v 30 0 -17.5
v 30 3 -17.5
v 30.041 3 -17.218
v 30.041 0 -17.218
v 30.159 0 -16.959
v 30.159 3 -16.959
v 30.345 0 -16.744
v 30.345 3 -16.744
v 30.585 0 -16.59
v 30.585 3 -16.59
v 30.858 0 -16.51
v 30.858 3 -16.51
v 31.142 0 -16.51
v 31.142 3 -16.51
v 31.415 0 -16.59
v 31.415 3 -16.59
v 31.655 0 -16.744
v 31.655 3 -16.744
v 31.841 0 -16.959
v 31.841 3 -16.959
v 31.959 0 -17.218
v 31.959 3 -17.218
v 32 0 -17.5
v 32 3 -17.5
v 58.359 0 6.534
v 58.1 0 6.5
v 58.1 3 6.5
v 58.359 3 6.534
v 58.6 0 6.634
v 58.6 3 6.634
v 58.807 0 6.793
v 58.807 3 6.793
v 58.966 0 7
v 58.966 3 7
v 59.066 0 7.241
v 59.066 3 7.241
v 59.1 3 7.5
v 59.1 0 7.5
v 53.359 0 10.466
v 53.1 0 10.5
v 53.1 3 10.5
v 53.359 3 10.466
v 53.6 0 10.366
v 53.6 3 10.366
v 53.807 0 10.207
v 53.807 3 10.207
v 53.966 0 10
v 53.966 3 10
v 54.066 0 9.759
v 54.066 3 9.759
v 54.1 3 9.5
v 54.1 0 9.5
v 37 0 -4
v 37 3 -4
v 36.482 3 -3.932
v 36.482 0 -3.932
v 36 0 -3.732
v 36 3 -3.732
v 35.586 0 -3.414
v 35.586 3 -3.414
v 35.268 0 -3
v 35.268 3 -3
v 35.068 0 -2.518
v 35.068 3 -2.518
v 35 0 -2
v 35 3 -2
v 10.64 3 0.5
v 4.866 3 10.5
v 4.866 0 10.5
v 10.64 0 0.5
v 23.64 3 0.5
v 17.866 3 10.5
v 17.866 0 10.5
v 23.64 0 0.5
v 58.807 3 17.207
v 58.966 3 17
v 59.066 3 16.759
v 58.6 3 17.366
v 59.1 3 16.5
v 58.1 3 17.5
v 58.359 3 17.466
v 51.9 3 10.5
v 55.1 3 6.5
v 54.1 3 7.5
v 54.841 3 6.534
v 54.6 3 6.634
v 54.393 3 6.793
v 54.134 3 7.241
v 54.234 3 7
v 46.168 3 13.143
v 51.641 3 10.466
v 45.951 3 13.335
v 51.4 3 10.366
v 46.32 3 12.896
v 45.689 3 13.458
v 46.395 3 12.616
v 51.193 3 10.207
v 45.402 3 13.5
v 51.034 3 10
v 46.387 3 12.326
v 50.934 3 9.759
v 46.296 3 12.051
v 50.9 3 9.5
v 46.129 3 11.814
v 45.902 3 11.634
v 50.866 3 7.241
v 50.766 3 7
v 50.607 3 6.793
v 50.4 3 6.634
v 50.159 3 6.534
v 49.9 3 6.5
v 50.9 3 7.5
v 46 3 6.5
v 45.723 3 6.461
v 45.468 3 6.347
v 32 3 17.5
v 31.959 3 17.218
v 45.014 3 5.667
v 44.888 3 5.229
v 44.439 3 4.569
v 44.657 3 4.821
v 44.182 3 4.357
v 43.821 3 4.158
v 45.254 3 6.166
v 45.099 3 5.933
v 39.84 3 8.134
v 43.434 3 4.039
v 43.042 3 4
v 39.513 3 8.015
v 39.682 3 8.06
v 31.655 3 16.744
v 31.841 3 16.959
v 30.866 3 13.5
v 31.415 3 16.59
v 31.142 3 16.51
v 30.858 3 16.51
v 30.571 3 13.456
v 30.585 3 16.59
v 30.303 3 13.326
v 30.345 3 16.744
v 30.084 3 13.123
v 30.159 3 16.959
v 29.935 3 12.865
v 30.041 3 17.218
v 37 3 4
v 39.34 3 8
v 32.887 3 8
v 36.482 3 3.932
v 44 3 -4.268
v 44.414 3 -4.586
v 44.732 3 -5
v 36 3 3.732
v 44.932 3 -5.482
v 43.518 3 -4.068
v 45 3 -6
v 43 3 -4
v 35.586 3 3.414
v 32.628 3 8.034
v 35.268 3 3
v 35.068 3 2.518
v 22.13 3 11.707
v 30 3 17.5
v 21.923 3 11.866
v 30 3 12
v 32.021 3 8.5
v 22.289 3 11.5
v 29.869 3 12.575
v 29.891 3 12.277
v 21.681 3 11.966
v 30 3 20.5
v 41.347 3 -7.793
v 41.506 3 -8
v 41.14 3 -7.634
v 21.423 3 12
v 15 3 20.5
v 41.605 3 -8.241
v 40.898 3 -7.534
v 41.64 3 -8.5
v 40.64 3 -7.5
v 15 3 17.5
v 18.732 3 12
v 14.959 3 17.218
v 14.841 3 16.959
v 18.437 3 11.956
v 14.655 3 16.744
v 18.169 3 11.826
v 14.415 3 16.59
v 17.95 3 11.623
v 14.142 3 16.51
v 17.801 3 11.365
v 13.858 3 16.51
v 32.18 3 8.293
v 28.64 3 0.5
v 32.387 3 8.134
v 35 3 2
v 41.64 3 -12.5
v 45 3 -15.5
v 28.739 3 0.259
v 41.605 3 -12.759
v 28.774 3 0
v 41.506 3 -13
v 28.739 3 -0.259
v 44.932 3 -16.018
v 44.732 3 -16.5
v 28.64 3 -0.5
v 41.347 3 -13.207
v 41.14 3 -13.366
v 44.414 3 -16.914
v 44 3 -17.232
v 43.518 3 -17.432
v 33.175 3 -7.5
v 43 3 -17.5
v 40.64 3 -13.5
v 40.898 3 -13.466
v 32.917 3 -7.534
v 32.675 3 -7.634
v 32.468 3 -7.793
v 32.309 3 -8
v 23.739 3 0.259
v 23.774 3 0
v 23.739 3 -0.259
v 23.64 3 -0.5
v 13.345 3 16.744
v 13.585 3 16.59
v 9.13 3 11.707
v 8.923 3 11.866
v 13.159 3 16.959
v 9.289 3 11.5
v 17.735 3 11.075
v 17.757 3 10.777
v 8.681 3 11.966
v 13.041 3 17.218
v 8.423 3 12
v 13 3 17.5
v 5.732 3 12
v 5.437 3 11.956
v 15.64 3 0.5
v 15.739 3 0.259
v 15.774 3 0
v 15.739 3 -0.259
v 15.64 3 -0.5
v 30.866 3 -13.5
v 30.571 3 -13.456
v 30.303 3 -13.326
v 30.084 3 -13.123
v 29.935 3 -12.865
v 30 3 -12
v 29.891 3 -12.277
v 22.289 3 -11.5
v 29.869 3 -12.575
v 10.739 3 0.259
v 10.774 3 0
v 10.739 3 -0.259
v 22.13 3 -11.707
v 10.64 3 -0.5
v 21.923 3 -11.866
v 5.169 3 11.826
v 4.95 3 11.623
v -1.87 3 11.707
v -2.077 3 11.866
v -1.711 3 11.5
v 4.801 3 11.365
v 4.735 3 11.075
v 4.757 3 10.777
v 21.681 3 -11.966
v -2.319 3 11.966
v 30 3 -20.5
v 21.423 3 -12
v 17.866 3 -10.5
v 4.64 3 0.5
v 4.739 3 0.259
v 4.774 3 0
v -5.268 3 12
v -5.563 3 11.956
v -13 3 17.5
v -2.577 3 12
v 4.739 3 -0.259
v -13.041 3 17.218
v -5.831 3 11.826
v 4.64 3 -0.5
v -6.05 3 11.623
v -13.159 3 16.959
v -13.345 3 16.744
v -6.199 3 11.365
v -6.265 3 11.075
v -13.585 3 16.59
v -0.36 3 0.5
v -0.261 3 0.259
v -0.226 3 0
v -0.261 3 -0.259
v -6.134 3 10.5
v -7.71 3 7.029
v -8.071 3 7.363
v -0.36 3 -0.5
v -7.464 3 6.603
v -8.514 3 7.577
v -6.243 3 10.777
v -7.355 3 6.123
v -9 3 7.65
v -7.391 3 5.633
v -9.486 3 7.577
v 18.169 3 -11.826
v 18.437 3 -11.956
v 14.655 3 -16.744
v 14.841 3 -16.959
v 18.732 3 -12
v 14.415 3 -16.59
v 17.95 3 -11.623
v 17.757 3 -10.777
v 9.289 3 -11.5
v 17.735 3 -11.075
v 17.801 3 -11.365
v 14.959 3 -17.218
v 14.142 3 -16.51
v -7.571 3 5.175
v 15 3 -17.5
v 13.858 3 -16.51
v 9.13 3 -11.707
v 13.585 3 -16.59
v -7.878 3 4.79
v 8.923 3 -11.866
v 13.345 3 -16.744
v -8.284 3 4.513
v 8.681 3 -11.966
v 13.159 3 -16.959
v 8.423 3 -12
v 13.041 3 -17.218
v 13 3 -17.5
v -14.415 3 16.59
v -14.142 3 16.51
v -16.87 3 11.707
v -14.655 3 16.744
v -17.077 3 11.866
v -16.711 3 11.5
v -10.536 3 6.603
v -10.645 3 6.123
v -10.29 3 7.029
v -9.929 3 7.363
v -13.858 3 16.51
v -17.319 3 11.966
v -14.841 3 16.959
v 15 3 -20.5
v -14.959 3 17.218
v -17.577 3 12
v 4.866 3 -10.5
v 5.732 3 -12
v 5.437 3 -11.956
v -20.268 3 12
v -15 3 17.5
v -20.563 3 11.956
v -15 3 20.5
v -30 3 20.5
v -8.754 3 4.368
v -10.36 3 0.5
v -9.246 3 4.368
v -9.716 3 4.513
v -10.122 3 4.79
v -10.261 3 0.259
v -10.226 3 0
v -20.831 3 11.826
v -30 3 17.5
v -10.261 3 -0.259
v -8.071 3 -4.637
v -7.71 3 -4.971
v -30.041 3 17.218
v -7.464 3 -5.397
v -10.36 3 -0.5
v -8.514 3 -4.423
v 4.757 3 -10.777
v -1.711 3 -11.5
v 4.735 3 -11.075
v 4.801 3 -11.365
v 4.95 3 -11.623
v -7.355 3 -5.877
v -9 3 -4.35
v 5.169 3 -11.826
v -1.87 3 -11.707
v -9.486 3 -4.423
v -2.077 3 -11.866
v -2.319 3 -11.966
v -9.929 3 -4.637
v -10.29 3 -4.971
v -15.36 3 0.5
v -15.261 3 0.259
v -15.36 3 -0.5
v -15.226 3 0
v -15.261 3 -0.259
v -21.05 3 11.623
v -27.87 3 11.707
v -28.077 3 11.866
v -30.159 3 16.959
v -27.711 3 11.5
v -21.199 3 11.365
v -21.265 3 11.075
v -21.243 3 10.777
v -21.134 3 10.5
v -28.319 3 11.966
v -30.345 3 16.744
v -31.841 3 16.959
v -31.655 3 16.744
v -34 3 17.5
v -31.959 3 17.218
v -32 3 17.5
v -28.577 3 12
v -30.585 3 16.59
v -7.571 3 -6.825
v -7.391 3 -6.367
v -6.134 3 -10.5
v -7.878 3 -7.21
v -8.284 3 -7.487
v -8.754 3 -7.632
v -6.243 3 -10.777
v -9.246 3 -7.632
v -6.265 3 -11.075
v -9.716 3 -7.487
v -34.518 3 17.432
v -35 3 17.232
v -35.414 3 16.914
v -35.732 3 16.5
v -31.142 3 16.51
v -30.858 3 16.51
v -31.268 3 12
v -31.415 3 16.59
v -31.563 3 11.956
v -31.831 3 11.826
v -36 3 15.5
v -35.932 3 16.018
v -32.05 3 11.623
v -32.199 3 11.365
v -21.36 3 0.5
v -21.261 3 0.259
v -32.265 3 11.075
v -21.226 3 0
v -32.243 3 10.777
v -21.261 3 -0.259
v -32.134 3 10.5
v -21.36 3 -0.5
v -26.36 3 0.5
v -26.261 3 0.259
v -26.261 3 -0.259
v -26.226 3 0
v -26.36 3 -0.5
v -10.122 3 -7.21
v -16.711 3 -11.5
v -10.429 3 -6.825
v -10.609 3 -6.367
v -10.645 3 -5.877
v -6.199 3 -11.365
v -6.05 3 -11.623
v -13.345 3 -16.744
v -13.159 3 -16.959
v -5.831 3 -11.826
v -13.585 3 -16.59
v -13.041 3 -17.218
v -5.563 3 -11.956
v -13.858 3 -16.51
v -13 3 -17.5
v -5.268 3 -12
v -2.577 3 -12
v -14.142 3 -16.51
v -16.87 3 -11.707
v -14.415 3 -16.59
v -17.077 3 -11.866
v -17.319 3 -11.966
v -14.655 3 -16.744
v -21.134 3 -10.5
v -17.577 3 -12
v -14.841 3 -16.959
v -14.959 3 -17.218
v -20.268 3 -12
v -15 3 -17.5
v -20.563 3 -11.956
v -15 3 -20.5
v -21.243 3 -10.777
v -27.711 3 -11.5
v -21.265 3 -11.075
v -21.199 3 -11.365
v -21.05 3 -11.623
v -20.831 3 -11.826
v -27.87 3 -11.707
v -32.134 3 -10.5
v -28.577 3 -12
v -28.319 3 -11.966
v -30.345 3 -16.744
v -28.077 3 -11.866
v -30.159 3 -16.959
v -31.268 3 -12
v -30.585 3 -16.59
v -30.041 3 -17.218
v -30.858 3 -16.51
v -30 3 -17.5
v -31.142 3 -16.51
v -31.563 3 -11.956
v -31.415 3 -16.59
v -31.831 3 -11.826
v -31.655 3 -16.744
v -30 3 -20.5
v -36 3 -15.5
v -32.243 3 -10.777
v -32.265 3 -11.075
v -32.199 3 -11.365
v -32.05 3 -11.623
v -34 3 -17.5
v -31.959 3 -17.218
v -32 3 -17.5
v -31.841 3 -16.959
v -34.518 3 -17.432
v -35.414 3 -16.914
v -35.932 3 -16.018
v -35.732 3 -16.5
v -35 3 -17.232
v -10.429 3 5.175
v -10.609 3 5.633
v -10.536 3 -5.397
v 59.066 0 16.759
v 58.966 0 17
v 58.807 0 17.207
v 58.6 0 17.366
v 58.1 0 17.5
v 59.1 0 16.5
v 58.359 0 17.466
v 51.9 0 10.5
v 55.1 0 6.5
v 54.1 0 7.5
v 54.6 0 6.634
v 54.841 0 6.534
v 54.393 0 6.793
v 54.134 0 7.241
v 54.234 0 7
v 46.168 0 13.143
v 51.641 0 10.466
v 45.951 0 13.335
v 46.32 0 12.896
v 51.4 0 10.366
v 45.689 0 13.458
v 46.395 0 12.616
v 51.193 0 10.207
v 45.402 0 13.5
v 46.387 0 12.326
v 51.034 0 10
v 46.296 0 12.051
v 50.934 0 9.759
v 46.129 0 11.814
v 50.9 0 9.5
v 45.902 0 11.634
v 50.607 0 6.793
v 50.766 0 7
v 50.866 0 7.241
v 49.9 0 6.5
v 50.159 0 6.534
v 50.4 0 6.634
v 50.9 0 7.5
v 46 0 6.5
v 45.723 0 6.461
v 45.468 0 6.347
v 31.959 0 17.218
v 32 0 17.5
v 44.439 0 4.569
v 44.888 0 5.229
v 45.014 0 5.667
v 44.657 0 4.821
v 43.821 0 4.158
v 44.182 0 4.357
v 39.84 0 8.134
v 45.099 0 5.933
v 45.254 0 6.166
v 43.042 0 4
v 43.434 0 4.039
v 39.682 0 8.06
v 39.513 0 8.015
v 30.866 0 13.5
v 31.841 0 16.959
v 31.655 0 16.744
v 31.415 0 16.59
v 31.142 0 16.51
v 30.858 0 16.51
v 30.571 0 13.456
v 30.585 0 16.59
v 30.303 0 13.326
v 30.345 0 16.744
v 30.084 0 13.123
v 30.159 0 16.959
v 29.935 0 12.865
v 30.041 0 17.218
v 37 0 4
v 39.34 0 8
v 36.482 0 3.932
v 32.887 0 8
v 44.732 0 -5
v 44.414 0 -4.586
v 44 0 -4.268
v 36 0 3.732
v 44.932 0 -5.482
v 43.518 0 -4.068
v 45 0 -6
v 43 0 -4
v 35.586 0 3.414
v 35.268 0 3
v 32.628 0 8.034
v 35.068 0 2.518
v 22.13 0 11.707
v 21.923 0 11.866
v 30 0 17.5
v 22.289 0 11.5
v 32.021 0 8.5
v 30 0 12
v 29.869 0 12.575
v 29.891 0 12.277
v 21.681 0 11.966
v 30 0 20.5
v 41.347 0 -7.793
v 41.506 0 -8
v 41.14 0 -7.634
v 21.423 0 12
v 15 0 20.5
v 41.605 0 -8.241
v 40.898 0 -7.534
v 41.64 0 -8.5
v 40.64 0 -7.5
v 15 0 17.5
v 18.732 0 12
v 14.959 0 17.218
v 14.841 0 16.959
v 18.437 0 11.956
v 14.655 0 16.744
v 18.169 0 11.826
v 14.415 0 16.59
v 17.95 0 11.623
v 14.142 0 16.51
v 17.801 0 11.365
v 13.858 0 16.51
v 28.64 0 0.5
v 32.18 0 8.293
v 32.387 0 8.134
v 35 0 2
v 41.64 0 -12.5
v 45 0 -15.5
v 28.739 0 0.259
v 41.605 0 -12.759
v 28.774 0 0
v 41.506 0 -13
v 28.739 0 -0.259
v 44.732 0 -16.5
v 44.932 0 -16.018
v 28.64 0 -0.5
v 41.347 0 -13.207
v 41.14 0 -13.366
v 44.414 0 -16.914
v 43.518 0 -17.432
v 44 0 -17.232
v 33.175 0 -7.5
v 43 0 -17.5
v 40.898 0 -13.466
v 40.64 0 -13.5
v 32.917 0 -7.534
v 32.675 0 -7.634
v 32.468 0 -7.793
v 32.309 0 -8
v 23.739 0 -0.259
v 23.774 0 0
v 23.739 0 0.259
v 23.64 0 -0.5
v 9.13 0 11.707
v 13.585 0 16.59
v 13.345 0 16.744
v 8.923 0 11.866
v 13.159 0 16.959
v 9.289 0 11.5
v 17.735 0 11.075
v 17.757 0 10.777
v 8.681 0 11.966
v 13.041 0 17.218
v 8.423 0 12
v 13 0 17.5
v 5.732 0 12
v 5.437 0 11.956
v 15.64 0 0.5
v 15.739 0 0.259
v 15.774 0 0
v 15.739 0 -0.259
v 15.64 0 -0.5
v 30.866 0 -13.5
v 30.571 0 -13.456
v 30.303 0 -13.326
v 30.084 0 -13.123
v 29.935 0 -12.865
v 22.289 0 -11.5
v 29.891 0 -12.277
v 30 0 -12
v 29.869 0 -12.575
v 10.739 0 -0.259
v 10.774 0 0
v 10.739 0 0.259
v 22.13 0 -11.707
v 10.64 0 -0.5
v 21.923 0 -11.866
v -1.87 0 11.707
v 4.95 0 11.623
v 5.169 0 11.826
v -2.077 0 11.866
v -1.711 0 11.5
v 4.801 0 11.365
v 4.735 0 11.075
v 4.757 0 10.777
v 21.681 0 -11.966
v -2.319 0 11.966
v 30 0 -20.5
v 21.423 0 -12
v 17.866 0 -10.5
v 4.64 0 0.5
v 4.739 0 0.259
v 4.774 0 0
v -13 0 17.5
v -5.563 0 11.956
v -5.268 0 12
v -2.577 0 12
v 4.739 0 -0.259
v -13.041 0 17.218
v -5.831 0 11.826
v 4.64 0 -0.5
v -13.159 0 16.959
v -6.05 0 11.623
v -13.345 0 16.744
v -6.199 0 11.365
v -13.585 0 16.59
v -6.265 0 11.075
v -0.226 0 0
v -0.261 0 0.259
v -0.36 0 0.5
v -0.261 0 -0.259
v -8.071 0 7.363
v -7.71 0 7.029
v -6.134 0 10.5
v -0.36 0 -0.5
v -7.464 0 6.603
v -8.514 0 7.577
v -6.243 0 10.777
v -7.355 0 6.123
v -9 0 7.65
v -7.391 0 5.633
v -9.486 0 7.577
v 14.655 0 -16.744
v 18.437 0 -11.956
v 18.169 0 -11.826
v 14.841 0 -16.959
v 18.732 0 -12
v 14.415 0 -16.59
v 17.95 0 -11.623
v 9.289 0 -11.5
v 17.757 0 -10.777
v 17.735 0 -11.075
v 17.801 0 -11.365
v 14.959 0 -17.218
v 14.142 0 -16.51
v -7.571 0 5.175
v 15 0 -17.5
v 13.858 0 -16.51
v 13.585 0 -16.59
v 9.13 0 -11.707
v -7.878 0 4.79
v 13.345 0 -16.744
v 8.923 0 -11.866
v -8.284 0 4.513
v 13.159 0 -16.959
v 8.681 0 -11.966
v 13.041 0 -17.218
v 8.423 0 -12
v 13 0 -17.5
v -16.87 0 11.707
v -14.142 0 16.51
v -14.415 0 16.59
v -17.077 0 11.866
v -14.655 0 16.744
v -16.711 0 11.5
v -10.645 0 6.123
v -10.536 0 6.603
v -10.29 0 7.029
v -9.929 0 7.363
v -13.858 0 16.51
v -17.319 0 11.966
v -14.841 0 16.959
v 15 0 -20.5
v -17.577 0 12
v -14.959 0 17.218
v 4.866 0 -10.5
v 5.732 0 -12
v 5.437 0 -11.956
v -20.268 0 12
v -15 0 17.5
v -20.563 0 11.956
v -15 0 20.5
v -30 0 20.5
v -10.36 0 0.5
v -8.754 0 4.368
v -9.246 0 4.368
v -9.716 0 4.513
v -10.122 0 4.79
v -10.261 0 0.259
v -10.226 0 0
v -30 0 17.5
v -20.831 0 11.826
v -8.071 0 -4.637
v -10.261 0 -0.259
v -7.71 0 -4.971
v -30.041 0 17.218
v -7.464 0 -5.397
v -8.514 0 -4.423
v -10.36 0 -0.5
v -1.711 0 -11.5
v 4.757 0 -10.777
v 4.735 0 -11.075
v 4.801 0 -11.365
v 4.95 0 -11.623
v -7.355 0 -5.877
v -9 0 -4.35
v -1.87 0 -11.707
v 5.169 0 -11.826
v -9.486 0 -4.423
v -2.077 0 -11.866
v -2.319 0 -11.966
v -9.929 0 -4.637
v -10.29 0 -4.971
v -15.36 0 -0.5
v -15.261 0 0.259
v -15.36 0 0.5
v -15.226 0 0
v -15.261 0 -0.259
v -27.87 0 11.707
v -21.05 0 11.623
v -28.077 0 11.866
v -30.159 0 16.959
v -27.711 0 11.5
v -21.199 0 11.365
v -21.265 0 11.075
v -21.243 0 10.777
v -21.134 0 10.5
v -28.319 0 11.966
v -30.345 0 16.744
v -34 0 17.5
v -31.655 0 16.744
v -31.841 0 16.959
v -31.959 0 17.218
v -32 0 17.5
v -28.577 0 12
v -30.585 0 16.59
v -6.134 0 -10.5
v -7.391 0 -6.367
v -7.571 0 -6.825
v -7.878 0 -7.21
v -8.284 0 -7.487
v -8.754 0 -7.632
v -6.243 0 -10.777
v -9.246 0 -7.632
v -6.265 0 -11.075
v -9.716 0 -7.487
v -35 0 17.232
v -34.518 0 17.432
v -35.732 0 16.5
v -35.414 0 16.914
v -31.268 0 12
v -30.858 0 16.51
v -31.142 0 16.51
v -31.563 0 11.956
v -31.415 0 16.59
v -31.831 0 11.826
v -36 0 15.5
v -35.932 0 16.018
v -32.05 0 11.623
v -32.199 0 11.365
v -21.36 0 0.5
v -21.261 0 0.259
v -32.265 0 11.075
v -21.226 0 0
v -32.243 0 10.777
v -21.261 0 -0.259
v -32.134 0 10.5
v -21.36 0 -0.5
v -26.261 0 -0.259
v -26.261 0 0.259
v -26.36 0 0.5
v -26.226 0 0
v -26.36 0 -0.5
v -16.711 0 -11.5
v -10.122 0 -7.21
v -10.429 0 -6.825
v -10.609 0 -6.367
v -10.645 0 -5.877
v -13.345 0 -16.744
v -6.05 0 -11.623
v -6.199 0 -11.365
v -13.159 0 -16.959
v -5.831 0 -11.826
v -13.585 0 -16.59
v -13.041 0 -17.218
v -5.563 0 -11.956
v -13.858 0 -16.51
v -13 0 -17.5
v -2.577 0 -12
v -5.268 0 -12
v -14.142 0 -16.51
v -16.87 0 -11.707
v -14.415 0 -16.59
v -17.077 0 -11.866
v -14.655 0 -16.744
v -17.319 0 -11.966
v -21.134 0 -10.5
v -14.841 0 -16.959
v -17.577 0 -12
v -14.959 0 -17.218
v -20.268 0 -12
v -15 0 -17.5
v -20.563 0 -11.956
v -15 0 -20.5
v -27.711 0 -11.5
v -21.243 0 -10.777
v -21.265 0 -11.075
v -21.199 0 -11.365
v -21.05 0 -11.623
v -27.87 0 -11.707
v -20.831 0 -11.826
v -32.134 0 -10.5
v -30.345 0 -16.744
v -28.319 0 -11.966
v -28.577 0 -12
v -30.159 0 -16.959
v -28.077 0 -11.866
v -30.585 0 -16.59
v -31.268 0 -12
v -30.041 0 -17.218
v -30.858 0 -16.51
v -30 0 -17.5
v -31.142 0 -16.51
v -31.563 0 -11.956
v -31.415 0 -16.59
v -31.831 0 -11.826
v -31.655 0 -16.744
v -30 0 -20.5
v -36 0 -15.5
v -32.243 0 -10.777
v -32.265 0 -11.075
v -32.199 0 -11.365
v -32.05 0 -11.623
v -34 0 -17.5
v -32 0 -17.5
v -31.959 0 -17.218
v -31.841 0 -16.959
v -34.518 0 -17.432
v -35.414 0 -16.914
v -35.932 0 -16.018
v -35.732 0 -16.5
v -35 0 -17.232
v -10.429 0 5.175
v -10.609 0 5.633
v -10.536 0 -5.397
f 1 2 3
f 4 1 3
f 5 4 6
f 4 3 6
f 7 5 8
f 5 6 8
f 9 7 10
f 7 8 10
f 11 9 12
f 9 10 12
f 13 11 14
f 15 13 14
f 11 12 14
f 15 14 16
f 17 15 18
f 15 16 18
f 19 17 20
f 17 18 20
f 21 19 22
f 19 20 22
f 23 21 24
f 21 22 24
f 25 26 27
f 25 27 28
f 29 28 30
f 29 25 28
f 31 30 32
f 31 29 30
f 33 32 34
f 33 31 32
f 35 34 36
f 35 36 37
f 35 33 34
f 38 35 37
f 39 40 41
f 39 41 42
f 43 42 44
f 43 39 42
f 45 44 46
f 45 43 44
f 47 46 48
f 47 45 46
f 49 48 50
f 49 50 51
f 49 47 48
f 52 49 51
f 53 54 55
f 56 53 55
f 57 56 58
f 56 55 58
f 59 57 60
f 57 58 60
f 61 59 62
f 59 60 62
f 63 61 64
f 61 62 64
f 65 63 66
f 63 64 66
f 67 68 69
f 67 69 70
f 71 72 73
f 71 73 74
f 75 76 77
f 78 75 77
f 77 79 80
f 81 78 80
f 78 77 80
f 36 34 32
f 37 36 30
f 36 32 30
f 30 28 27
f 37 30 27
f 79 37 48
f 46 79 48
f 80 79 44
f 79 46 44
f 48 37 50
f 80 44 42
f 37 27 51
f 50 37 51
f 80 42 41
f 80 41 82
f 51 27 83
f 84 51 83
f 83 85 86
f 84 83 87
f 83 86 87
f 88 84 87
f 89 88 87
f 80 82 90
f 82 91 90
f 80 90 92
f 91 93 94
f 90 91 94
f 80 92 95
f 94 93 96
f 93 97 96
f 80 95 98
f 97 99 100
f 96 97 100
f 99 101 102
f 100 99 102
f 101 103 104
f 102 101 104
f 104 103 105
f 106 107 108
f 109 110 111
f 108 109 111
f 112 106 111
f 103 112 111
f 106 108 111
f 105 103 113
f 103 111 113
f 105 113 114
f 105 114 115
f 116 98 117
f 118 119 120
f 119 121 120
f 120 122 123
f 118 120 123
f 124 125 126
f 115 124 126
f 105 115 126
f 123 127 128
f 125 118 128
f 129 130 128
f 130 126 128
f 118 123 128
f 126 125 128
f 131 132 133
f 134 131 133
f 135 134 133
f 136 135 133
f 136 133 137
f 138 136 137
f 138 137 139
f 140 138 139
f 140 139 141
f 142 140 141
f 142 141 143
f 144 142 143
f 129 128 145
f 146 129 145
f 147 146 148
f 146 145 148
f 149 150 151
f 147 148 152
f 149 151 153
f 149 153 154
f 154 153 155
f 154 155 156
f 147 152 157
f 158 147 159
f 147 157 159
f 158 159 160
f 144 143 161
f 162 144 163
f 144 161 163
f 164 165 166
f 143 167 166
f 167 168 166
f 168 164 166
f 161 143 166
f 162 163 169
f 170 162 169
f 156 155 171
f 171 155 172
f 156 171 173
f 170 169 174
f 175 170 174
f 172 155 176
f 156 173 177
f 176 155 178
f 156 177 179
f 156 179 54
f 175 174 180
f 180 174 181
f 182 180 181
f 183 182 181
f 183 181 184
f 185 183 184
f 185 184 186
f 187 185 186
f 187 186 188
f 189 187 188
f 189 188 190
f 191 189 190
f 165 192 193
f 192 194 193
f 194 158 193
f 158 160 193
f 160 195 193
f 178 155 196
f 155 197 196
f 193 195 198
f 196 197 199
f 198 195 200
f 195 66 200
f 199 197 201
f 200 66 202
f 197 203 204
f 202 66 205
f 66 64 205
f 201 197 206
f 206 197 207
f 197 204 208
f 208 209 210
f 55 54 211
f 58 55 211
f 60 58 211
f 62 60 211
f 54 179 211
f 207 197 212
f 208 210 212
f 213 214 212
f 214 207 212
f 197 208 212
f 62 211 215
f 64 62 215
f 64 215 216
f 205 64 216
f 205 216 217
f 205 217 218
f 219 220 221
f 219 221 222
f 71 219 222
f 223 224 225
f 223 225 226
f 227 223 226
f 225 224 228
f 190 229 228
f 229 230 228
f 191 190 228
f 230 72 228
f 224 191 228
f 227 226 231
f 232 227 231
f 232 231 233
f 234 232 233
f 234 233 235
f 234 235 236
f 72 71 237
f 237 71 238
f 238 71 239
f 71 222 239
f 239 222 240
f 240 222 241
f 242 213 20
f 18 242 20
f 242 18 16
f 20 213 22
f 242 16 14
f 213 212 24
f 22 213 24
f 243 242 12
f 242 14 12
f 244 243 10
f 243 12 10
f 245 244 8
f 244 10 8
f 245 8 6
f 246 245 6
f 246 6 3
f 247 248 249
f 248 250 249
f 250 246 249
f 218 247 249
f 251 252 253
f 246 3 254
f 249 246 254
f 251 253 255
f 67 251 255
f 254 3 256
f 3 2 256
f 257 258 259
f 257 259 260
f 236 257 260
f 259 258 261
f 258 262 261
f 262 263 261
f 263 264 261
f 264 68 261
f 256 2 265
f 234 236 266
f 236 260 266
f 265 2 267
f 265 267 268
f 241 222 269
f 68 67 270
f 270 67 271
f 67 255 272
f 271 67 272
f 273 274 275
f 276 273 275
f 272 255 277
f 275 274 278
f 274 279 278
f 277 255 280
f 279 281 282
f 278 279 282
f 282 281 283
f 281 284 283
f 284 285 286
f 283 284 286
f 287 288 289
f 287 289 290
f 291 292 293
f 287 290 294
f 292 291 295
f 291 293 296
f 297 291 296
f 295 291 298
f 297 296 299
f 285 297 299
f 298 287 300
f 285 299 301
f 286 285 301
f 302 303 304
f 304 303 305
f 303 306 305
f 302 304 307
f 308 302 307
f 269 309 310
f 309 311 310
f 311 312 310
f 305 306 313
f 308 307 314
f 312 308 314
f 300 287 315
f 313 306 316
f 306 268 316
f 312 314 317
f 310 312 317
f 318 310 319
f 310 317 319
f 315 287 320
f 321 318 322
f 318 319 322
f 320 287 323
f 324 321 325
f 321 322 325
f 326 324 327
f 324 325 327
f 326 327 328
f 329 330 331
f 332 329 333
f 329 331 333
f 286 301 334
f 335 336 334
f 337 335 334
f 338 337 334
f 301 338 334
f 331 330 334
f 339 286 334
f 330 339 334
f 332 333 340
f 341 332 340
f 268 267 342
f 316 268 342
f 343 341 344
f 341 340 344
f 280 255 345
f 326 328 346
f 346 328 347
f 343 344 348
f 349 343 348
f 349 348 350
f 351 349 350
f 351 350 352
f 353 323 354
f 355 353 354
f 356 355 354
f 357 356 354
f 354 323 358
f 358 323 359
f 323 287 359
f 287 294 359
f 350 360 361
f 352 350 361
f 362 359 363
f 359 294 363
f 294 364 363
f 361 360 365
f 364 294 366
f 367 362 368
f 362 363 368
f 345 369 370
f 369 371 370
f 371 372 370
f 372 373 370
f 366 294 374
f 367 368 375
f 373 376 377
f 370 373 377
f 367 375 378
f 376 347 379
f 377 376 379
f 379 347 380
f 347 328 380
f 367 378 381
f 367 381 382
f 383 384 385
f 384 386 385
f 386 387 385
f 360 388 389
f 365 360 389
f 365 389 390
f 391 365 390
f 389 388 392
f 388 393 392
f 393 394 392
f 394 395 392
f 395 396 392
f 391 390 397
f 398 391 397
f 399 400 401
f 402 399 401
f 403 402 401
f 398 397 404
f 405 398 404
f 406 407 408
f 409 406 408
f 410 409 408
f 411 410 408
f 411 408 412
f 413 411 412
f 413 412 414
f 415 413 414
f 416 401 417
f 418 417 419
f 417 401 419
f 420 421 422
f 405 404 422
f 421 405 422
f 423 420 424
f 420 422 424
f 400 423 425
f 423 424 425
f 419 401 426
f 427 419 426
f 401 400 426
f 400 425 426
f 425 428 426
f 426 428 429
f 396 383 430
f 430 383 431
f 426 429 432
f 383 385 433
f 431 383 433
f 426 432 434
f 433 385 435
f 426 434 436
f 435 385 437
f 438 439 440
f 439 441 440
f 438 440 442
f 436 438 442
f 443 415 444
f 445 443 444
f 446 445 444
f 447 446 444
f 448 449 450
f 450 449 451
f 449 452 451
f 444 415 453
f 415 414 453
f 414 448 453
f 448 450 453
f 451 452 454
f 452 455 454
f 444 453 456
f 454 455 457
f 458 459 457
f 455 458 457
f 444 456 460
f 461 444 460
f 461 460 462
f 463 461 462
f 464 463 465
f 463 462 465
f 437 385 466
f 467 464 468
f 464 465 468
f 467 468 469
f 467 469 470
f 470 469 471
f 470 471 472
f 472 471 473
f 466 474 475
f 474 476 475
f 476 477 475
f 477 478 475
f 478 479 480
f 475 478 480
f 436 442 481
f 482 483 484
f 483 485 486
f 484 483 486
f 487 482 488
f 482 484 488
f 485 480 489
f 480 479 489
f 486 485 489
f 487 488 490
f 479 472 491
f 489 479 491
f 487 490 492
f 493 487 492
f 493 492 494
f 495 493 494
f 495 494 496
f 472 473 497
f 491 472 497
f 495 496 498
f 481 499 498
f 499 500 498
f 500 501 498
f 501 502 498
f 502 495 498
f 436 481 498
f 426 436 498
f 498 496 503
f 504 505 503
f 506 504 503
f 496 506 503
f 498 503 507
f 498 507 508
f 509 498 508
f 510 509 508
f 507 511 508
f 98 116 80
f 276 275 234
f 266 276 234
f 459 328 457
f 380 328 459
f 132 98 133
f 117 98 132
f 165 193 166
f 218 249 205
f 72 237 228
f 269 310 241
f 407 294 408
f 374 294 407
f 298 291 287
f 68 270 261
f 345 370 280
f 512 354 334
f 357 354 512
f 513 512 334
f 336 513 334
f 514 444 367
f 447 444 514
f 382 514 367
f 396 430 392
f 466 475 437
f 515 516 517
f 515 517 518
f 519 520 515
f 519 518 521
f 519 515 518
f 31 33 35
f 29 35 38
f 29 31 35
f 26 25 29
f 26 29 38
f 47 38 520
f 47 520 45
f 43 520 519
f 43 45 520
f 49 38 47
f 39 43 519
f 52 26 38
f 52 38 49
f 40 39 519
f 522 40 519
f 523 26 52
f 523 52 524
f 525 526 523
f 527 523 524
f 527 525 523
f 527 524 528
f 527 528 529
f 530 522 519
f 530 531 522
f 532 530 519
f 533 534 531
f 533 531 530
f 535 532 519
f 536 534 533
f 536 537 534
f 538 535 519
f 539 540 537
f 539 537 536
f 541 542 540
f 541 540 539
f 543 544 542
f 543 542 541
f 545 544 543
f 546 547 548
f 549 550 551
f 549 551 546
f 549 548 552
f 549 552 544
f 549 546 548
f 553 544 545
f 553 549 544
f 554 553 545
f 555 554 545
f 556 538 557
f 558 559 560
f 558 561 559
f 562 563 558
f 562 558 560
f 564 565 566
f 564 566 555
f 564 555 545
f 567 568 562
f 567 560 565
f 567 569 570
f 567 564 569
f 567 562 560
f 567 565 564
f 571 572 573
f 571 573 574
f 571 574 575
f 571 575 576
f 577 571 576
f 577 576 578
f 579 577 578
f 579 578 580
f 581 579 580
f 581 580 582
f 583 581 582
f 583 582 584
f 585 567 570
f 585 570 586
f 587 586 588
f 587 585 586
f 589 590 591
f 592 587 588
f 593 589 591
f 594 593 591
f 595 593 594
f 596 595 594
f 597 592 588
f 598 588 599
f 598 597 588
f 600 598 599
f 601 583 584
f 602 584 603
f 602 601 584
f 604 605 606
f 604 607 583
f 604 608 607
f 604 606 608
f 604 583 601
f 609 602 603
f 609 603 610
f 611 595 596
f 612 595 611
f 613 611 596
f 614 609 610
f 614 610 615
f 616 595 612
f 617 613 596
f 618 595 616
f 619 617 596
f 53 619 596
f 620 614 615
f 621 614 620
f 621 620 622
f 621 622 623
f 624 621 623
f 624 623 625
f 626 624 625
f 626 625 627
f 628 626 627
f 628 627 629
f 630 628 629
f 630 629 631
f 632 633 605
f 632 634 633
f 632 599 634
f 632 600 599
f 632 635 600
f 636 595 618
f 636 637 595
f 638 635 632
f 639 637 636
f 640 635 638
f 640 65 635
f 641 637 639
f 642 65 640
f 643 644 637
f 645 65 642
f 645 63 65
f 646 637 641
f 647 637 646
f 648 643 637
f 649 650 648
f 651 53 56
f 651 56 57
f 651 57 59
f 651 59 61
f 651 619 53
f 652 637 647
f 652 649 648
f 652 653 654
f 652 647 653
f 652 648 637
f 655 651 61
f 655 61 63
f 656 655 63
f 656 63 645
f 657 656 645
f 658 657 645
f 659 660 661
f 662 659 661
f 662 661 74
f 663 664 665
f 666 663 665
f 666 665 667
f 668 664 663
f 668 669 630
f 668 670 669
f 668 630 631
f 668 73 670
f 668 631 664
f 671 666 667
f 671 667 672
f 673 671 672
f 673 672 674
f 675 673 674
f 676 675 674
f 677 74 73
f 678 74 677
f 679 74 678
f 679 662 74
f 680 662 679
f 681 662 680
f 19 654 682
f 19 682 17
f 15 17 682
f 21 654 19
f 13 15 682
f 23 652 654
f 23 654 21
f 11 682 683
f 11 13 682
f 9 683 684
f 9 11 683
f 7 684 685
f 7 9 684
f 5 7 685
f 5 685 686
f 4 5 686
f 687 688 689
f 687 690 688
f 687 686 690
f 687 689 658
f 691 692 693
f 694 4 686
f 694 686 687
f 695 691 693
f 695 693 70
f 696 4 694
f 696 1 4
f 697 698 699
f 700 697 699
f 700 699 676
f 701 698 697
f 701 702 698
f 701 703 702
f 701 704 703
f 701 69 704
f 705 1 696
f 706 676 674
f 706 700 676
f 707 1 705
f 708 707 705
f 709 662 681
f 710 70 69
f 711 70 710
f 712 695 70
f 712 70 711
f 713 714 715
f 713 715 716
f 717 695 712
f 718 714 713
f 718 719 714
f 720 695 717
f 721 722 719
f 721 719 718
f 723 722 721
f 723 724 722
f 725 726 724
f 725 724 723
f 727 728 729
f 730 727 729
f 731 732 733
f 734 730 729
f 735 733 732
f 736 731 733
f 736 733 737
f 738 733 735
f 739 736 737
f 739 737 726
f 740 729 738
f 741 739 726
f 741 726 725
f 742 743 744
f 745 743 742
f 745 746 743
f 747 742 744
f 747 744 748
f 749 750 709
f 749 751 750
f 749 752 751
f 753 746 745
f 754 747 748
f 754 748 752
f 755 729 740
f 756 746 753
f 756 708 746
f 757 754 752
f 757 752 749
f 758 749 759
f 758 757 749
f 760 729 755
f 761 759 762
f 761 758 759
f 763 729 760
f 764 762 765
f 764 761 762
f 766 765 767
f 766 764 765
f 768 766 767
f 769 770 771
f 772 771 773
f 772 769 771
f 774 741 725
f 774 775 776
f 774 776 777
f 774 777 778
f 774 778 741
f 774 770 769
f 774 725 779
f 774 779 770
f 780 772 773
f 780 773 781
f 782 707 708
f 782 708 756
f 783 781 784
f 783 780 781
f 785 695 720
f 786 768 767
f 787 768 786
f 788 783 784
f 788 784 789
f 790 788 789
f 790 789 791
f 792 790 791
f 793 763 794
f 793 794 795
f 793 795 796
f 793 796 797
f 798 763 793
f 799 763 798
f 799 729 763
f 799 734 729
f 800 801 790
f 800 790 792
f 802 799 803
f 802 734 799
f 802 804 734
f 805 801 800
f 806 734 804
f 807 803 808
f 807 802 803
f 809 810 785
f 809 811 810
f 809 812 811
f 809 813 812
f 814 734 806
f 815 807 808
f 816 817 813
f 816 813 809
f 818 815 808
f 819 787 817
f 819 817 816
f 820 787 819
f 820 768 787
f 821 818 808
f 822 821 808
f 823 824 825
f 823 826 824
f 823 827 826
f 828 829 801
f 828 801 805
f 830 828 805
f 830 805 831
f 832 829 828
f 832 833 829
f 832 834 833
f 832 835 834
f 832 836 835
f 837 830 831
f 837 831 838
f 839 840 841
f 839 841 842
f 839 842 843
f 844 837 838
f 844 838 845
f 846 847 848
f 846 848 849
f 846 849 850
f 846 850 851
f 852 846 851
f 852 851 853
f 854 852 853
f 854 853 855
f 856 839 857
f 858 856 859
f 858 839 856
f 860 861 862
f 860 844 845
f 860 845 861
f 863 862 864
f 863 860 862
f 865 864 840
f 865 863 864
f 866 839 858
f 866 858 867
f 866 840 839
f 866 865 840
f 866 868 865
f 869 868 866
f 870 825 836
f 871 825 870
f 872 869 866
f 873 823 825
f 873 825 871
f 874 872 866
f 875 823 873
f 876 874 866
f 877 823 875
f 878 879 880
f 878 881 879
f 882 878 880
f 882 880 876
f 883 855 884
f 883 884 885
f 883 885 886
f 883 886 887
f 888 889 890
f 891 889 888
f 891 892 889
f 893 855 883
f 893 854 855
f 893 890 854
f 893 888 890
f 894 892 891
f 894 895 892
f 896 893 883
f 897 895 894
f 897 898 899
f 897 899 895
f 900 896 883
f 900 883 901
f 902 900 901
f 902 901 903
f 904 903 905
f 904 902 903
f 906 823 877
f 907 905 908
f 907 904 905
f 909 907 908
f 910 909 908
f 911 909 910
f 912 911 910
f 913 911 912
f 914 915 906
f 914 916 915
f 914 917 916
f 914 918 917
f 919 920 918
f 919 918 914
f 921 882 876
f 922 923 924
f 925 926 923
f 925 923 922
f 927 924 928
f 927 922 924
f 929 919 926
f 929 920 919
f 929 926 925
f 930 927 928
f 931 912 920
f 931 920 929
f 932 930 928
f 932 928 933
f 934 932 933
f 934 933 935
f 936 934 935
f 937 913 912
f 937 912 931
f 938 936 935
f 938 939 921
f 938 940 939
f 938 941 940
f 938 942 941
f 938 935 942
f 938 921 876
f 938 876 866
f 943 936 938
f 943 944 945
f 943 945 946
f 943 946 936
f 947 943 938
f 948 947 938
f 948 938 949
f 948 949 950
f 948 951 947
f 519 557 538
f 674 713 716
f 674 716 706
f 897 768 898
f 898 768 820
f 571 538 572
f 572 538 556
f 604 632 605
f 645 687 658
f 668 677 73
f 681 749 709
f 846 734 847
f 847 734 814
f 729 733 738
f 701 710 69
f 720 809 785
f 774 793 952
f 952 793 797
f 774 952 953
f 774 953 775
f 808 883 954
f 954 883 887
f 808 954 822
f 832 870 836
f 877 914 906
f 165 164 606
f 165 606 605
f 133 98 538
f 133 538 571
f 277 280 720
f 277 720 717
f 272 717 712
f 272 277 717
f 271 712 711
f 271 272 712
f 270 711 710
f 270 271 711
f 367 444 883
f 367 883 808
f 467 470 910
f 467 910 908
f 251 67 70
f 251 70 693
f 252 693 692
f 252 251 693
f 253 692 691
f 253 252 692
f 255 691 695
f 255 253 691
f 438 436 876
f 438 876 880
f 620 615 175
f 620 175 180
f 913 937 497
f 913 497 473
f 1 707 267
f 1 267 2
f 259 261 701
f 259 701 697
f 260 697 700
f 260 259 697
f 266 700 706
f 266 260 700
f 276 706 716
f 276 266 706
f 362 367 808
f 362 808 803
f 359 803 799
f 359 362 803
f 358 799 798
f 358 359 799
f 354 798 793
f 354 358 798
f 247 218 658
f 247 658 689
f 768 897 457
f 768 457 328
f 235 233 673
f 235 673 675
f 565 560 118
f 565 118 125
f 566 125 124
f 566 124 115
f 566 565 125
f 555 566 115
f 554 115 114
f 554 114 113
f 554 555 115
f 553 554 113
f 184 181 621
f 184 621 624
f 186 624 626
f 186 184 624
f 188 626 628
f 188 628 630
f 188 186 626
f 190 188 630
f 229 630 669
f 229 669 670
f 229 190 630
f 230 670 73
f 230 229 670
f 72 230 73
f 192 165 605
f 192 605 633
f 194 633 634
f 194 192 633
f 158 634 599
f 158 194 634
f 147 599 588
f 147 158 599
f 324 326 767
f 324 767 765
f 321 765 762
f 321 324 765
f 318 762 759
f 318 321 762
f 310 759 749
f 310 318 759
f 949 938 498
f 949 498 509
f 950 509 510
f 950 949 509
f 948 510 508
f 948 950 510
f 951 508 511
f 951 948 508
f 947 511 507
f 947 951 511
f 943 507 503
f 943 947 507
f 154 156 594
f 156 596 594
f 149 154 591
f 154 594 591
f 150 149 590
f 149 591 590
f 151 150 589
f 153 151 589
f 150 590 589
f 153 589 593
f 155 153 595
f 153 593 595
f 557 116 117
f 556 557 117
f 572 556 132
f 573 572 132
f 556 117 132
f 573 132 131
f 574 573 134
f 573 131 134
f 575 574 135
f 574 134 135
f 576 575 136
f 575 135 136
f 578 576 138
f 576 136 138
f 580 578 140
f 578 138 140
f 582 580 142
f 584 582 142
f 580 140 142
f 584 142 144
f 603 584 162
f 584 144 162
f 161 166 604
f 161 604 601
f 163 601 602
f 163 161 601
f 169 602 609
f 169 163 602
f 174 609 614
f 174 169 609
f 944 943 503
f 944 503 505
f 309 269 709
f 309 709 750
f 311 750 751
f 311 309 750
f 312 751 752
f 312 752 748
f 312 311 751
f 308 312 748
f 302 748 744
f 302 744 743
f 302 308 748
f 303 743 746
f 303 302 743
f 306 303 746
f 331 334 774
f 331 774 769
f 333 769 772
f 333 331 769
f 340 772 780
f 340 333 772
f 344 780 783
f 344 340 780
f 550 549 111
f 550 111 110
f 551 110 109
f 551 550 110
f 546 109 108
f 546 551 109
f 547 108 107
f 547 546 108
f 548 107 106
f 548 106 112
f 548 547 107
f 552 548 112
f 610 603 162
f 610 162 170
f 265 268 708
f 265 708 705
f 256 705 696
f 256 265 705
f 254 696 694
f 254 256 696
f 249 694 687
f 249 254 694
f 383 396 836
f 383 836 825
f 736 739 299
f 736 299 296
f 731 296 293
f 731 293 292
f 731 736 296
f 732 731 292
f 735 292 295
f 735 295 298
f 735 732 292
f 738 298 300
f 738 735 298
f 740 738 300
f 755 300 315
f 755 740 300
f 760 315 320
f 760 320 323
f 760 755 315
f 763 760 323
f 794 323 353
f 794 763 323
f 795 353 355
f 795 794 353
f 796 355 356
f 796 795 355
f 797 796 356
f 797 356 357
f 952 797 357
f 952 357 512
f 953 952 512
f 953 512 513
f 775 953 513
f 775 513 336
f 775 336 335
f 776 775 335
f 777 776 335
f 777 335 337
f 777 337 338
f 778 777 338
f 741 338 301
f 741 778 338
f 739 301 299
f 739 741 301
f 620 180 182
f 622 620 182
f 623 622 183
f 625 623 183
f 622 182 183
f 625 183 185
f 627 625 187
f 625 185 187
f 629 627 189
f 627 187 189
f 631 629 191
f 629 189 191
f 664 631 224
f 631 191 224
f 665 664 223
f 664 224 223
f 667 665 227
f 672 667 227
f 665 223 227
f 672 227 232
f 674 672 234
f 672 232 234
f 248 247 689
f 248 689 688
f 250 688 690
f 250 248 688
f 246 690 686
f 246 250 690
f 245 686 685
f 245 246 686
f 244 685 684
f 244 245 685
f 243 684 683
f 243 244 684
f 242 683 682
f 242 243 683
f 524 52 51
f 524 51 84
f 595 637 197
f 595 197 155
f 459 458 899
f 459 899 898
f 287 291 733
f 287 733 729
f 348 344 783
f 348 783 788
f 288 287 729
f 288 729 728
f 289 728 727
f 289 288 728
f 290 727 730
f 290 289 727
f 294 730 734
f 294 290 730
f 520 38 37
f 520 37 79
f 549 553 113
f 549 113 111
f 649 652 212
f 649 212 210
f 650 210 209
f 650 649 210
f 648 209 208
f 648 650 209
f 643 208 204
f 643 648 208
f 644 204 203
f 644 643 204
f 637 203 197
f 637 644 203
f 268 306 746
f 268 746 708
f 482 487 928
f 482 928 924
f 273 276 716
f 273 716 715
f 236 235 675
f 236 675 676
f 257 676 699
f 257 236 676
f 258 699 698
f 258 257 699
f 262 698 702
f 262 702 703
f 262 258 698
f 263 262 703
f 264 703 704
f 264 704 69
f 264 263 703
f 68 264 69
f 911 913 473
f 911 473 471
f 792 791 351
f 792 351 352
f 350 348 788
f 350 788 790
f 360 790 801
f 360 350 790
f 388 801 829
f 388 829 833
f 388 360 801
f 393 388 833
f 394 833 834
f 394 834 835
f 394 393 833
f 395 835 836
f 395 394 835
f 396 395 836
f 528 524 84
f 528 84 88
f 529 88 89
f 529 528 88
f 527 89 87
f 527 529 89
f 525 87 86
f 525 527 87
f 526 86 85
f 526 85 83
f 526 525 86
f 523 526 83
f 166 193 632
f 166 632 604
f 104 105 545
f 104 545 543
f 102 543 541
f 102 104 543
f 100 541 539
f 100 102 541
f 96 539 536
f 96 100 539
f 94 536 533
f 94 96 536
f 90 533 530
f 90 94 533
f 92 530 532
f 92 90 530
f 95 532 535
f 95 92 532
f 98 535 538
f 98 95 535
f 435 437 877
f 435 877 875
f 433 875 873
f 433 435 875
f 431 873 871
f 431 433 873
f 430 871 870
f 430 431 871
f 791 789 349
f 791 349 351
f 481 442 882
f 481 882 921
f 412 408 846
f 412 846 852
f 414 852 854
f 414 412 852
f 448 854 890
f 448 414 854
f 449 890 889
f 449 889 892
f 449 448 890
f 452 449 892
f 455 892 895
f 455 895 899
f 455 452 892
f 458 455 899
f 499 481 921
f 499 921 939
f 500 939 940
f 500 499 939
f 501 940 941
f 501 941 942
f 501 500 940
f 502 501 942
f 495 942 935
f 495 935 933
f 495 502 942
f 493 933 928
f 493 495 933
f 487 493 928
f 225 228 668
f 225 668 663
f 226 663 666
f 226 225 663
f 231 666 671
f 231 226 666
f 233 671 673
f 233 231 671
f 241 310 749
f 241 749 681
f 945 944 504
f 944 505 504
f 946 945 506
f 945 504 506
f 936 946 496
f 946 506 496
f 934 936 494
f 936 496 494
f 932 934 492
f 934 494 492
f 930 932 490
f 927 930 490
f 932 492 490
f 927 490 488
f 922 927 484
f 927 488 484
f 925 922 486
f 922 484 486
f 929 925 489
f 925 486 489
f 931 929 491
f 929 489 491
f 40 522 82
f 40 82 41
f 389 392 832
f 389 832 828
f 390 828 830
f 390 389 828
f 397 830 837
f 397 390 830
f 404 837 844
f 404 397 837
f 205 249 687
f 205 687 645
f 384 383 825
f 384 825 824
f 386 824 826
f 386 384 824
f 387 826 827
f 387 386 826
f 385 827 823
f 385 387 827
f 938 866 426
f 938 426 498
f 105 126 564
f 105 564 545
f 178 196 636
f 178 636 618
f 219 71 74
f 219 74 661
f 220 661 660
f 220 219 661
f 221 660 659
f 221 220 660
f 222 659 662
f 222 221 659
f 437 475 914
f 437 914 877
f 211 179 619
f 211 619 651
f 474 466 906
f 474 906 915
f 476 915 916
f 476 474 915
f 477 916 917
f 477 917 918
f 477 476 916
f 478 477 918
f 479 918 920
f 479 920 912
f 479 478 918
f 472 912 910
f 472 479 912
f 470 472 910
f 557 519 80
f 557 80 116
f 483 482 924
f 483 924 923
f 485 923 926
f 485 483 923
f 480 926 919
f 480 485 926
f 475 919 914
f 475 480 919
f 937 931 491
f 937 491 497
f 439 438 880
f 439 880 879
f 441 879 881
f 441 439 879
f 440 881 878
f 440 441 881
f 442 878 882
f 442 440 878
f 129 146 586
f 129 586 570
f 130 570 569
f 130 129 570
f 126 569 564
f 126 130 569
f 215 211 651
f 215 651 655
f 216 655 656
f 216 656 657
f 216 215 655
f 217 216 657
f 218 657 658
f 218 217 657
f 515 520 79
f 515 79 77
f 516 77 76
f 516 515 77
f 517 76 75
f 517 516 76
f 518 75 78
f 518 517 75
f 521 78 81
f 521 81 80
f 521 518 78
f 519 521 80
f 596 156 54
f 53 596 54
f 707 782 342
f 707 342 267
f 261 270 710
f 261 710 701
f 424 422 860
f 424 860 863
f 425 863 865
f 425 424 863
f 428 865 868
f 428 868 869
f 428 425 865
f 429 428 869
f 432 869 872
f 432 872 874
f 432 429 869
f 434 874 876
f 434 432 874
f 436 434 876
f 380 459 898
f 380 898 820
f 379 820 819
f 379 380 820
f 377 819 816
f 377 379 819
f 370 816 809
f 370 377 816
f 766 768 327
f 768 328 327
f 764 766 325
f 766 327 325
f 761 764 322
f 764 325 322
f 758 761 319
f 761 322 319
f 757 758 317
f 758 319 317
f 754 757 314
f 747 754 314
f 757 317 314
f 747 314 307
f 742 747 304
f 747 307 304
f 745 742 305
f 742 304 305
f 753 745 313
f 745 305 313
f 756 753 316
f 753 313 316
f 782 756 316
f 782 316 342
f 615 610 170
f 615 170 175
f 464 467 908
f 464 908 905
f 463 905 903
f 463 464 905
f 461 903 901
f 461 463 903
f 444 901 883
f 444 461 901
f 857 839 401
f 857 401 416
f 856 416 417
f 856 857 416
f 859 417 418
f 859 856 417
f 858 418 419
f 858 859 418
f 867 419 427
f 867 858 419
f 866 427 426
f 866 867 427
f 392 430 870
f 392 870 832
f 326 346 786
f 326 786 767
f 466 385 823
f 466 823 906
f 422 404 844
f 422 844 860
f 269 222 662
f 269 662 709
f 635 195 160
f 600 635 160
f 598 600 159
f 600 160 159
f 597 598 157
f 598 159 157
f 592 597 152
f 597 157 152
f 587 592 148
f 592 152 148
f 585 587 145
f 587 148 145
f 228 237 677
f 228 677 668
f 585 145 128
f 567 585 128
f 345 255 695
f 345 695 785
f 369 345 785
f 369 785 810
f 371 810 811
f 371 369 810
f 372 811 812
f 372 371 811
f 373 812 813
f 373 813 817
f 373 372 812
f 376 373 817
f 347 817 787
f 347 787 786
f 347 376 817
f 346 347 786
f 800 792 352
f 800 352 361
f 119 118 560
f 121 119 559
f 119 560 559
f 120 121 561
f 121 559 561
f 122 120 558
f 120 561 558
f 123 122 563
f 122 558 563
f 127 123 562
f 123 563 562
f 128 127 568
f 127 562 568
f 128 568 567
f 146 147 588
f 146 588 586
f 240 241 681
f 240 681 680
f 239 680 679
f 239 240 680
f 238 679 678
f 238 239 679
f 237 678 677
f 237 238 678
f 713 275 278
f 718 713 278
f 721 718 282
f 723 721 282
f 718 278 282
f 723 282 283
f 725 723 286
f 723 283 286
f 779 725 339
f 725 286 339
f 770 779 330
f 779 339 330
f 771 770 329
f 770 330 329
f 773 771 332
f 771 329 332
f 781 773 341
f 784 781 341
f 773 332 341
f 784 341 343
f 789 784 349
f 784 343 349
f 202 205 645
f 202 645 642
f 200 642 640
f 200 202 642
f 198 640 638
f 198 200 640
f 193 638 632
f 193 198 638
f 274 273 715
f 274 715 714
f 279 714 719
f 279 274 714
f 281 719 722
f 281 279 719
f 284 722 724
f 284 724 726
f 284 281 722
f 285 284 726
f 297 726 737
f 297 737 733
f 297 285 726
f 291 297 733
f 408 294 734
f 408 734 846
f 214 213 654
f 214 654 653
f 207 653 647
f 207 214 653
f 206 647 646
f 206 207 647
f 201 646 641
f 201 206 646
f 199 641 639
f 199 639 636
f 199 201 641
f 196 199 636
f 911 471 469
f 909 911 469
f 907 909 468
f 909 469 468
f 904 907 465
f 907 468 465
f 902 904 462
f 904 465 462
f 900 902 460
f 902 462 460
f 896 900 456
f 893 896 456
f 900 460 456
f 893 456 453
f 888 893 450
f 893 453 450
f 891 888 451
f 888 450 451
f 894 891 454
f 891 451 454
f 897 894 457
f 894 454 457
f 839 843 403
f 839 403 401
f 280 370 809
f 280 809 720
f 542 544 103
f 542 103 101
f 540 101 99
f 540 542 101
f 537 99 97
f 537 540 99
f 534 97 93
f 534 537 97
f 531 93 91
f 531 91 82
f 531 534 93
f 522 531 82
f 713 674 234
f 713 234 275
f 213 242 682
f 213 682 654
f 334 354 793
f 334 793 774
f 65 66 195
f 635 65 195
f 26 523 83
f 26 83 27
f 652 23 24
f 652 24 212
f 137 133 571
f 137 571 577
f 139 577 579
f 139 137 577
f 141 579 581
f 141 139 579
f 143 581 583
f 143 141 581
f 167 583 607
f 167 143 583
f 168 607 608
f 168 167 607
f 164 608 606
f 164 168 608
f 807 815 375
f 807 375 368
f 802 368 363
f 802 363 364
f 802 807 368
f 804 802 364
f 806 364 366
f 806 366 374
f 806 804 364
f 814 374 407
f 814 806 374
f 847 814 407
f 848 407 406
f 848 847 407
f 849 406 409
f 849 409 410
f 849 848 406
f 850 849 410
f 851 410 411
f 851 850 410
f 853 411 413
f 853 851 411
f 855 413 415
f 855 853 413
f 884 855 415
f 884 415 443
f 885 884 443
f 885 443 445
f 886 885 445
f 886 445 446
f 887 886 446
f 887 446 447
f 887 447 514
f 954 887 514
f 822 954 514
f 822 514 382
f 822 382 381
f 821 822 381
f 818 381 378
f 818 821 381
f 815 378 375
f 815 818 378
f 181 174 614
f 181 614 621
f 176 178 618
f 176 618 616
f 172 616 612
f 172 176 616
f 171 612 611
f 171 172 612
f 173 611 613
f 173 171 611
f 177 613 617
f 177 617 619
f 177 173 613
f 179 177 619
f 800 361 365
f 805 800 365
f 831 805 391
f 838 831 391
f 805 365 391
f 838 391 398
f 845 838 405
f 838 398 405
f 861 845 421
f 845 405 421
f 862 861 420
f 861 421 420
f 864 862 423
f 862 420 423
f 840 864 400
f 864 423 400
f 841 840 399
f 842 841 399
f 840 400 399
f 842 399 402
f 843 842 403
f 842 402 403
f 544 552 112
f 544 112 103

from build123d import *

# Parameters (mm, degrees)
SKETCH_1_R          = 1.65
EXTRUDE_1_DEPTH     = 3
CUT_EXTRUDE_1_DEPTH = 3
FILLET_1_R          = 2
SKETCH_3_R          = 1
CUT_EXTRUDE_2_DEPTH = 3
CUT_EXTRUDE_3_DEPTH = 3


with BuildPart() as part:
    # 草图1 → 凸台-拉伸1 (new body)
    with BuildSketch(Plane(origin=(0, 0, 0), x_dir=(1, 0, 0), z_dir=(0, 1, 0))):
        with BuildLine():
            Line((-30, 20.5), (-15, 20.5))
            Line((-15, 20.5), (-15, 17.5))
            Line((-15, 17.5), (15, 17.5))
            Line((15, 17.5), (15, 20.5))
            Line((15, 20.5), (30, 20.5))
            Line((30, 20.5), (30, 17.5))
            Line((30, 17.5), (43, 17.5))
            ThreePointArc((43, 17.5), (44.414213562, 16.914213562), (45, 15.5))
            Line((45, 15.5), (45, -5.5))
            ThreePointArc((45, -5.5), (45.292893219, -6.207106781), (46, -6.5))
            Line((46, -6.5), (49.9, -6.5))
            ThreePointArc((49.9, -6.5), (50.607106781, -6.792893219), (50.9, -7.5))
            Line((50.9, -7.5), (50.9, -9.5))
            ThreePointArc((50.9, -9.5), (51.192893219, -10.207106781), (51.9, -10.5))
            Line((51.9, -10.5), (53.1, -10.5))
            ThreePointArc((53.1, -10.5), (53.807106781, -10.207106781), (54.1, -9.5))
            Line((54.1, -9.5), (54.1, -7.5))
            ThreePointArc((54.1, -7.5), (54.392893219, -6.792893219), (55.1, -6.5))
            Line((55.1, -6.5), (58.1, -6.5))
            ThreePointArc((58.1, -6.5), (58.807106781, -6.792893219), (59.1, -7.5))
            Line((59.1, -7.5), (59.1, -16.5))
            ThreePointArc((59.1, -16.5), (58.807106781, -17.207106781), (58.1, -17.5))
            Line((58.1, -17.5), (30, -17.5))
            Line((30, -17.5), (30, -20.5))
            Line((30, -20.5), (15, -20.5))
            Line((15, -20.5), (15, -17.5))
            Line((15, -17.5), (-15, -17.5))
            Line((-15, -17.5), (-15, -20.5))
            Line((-15, -20.5), (-30, -20.5))
            Line((-30, -20.5), (-30, -17.5))
            Line((-30, -17.5), (-34, -17.5))
            ThreePointArc((-34, -17.5), (-35.414213562, -16.914213562), (-36, -15.5))
            Line((-36, -15.5), (-36, 15.5))
            ThreePointArc((-36, 15.5), (-35.414213562, 16.914213562), (-34, 17.5))
            Line((-34, 17.5), (-30, 17.5))
            Line((-30, 17.5), (-30, 20.5))
        make_face()
        with Locations(Location((-9, 6, 0), (0, 0, 270))):
            Circle(SKETCH_1_R, mode=Mode.SUBTRACT)
        with Locations(Location((-9, -6, 0), (0, 0, 270))):
            Circle(SKETCH_1_R, mode=Mode.SUBTRACT)
    extrude(amount=EXTRUDE_1_DEPTH)

    # 草图2 → 切除-拉伸1 (cut)
    with BuildSketch(Plane(origin=(0, 3, 0), x_dir=(1, 0, 0), z_dir=(0, 1, 0))):
        with BuildLine():
            Line((37, -4), (45, -4))
            Line((45, -4), (45, 4))
            Line((45, 4), (37, 4))
            ThreePointArc((37, 4), (35.585786438, 3.414213562), (35, 2))
            Line((35, 2), (35, -2))
            ThreePointArc((35, -2), (35.585786438, -3.414213562), (37, -4))
        make_face()
    extrude(amount=-CUT_EXTRUDE_1_DEPTH, mode=Mode.SUBTRACT)

    # 圆角1
    fillet_1_edges = [part.edges().sort_by_distance(p)[0] for p in [
        (45, 1.5, 4),
        (45, 1.5, -4),
    ]]
    fillet(fillet_1_edges, radius=FILLET_1_R)

    # 草图3 → 切除-拉伸2 (cut)
    with BuildSketch(Plane(origin=(0, 3, 0), x_dir=(1, 0, 0), z_dir=(0, 1, 0))):
        with Locations((-31, 17.5)):
            Circle(SKETCH_3_R)
        with Locations((-14, 17.5)):
            Circle(SKETCH_3_R)
        with Locations((14, 17.5)):
            Circle(SKETCH_3_R)
        with Locations((31, 17.5)):
            Circle(SKETCH_3_R)
        with Locations((-31, -17.5)):
            Circle(SKETCH_3_R)
        with Locations((-14, -17.5)):
            Circle(SKETCH_3_R)
        with Locations((14, -17.5)):
            Circle(SKETCH_3_R)
        with Locations((31, -17.5)):
            Circle(SKETCH_3_R)
    extrude(amount=-CUT_EXTRUDE_2_DEPTH, mode=Mode.SUBTRACT)

    # 草图4 → 切除-拉伸3 (cut)
    with BuildSketch(Plane(origin=(0, 3, 0), x_dir=(1, 0, 0), z_dir=(0, 1, 0))):
        with BuildLine():
            Line((-15.360471904, 0.5), (-21.133974596, 10.5))
            ThreePointArc((-21.133974596, 10.5), (-21.133974596, 11.5), (-20.267949192, 12))
            Line((-20.267949192, 12), (-17.577350269, 12))
            ThreePointArc((-17.577350269, 12), (-17.077350269, 11.866025404), (-16.711324865, 11.5))
            Line((-16.711324865, 11.5), (-10.360471904, 0.5))
            ThreePointArc((-10.360471904, 0.5), (-10.226497308, 0), (-10.360471904, -0.5))
            Line((-10.360471904, -0.5), (-16.711324865, -11.5))
            ThreePointArc((-16.711324865, -11.5), (-17.077350269, -11.866025404), (-17.577350269, -12))
            Line((-17.577350269, -12), (-20.267949192, -12))
            ThreePointArc((-20.267949192, -12), (-21.133974596, -11.5), (-21.133974596, -10.5))
            Line((-21.133974596, -10.5), (-15.360471904, -0.5))
            ThreePointArc((-15.360471904, -0.5), (-15.226497308, 0), (-15.360471904, 0.5))
        make_face()
        with BuildLine():
            Line((-31.267949192, 12), (-28.577350269, 12))
            ThreePointArc((-28.577350269, 12), (-28.077350269, 11.866025404), (-27.711324865, 11.5))
            Line((-27.711324865, 11.5), (-21.360471904, 0.5))
            ThreePointArc((-21.360471904, 0.5), (-21.226497308, 0), (-21.360471904, -0.5))
            Line((-21.360471904, -0.5), (-27.711324865, -11.5))
            ThreePointArc((-27.711324865, -11.5), (-28.077350269, -11.866025404), (-28.577350269, -12))
            Line((-28.577350269, -12), (-31.267949192, -12))
            ThreePointArc((-31.267949192, -12), (-32.133974596, -11.5), (-32.133974596, -10.5))
            Line((-32.133974596, -10.5), (-26.360471904, -0.5))
            ThreePointArc((-26.360471904, -0.5), (-26.226497308, 0), (-26.360471904, 0.5))
            Line((-26.360471904, 0.5), (-32.133974596, 10.5))
            ThreePointArc((-32.133974596, 10.5), (-32.133974596, 11.5), (-31.267949192, 12))
        make_face()
        with BuildLine():
            Line((10.639528096, 0.5), (4.866025404, 10.5))
            ThreePointArc((4.866025404, 10.5), (4.866025404, 11.5), (5.732050808, 12))
            Line((5.732050808, 12), (8.422649731, 12))
            ThreePointArc((8.422649731, 12), (8.922649731, 11.866025404), (9.288675135, 11.5))
            Line((9.288675135, 11.5), (15.639528096, 0.5))
            ThreePointArc((15.639528096, 0.5), (15.773502692, 0), (15.639528096, -0.5))
            Line((15.639528096, -0.5), (9.288675135, -11.5))
            ThreePointArc((9.288675135, -11.5), (8.922649731, -11.866025404), (8.422649731, -12))
            Line((8.422649731, -12), (5.732050808, -12))
            ThreePointArc((5.732050808, -12), (4.866025404, -11.5), (4.866025404, -10.5))
            Line((4.866025404, -10.5), (10.639528096, -0.5))
            ThreePointArc((10.639528096, -0.5), (10.773502692, 0), (10.639528096, 0.5))
        make_face()
        with BuildLine():
            Line((-0.360471904, 0.5), (-6.133974596, 10.5))
            ThreePointArc((-6.133974596, 10.5), (-6.133974596, 11.5), (-5.267949192, 12))
            Line((-5.267949192, 12), (-2.577350269, 12))
            ThreePointArc((-2.577350269, 12), (-2.077350269, 11.866025404), (-1.711324865, 11.5))
            Line((-1.711324865, 11.5), (4.639528096, 0.5))
            ThreePointArc((4.639528096, 0.5), (4.773502692, 0), (4.639528096, -0.5))
            Line((4.639528096, -0.5), (-1.711324865, -11.5))
            ThreePointArc((-1.711324865, -11.5), (-2.077350269, -11.866025404), (-2.577350269, -12))
            Line((-2.577350269, -12), (-5.267949192, -12))
            ThreePointArc((-5.267949192, -12), (-6.133974596, -11.5), (-6.133974596, -10.5))
            Line((-6.133974596, -10.5), (-0.360471904, -0.5))
            ThreePointArc((-0.360471904, -0.5), (-0.226497308, 0), (-0.360471904, 0.5))
        make_face()
        with BuildLine():
            Line((23.639528096, 0.5), (17.866025404, 10.5))
            ThreePointArc((17.866025404, 10.5), (17.866025404, 11.5), (18.732050808, 12))
            Line((18.732050808, 12), (21.422649731, 12))
            ThreePointArc((21.422649731, 12), (21.922649731, 11.866025404), (22.288675135, 11.5))
            Line((22.288675135, 11.5), (28.639528096, 0.5))
            ThreePointArc((28.639528096, 0.5), (28.773502692, 0), (28.639528096, -0.5))
            Line((28.639528096, -0.5), (22.288675135, -11.5))
            ThreePointArc((22.288675135, -11.5), (21.922649731, -11.866025404), (21.422649731, -12))
            Line((21.422649731, -12), (18.732050808, -12))
            ThreePointArc((18.732050808, -12), (17.866025404, -11.5), (17.866025404, -10.5))
            Line((17.866025404, -10.5), (23.639528096, -0.5))
            ThreePointArc((23.639528096, -0.5), (23.773502692, 0), (23.639528096, 0.5))
        make_face()
        with BuildLine():
            Line((30.866025404, 13.5), (40.639528096, 13.5))
            ThreePointArc((40.639528096, 13.5), (41.346634877, 13.207106781), (41.639528096, 12.5))
            Line((41.639528096, 12.5), (41.639528096, 8.5))
            ThreePointArc((41.639528096, 8.5), (41.346634877, 7.792893219), (40.639528096, 7.5))
            Line((40.639528096, 7.5), (33.175426481, 7.5))
            ThreePointArc((33.175426481, 7.5), (32.675426481, 7.633974596), (32.309401077, 8))
            Line((32.309401077, 8), (30, 12))
            ThreePointArc((30, 12), (30, 13), (30.866025404, 13.5))
        make_face()
        with BuildLine():
            Line((32.886751346, -8), (39.339745962, -8))
            ThreePointArc((39.339745962, -8), (39.598565007, -8.034074174), (39.839745962, -8.133974596))
            Line((39.839745962, -8.133974596), (45.901923789, -11.633974596))
            ThreePointArc((45.901923789, -11.633974596), (46.367849615, -12.758819045), (45.401923789, -13.5))
            Line((45.401923789, -13.5), (30.866025404, -13.5))
            ThreePointArc((30.866025404, -13.5), (30, -13), (30, -12))
            Line((30, -12), (32.020725942, -8.5))
            ThreePointArc((32.020725942, -8.5), (32.386751346, -8.133974596), (32.886751346, -8))
        make_face()
    extrude(amount=-CUT_EXTRUDE_3_DEPTH, mode=Mode.SUBTRACT)


solid = part.part
